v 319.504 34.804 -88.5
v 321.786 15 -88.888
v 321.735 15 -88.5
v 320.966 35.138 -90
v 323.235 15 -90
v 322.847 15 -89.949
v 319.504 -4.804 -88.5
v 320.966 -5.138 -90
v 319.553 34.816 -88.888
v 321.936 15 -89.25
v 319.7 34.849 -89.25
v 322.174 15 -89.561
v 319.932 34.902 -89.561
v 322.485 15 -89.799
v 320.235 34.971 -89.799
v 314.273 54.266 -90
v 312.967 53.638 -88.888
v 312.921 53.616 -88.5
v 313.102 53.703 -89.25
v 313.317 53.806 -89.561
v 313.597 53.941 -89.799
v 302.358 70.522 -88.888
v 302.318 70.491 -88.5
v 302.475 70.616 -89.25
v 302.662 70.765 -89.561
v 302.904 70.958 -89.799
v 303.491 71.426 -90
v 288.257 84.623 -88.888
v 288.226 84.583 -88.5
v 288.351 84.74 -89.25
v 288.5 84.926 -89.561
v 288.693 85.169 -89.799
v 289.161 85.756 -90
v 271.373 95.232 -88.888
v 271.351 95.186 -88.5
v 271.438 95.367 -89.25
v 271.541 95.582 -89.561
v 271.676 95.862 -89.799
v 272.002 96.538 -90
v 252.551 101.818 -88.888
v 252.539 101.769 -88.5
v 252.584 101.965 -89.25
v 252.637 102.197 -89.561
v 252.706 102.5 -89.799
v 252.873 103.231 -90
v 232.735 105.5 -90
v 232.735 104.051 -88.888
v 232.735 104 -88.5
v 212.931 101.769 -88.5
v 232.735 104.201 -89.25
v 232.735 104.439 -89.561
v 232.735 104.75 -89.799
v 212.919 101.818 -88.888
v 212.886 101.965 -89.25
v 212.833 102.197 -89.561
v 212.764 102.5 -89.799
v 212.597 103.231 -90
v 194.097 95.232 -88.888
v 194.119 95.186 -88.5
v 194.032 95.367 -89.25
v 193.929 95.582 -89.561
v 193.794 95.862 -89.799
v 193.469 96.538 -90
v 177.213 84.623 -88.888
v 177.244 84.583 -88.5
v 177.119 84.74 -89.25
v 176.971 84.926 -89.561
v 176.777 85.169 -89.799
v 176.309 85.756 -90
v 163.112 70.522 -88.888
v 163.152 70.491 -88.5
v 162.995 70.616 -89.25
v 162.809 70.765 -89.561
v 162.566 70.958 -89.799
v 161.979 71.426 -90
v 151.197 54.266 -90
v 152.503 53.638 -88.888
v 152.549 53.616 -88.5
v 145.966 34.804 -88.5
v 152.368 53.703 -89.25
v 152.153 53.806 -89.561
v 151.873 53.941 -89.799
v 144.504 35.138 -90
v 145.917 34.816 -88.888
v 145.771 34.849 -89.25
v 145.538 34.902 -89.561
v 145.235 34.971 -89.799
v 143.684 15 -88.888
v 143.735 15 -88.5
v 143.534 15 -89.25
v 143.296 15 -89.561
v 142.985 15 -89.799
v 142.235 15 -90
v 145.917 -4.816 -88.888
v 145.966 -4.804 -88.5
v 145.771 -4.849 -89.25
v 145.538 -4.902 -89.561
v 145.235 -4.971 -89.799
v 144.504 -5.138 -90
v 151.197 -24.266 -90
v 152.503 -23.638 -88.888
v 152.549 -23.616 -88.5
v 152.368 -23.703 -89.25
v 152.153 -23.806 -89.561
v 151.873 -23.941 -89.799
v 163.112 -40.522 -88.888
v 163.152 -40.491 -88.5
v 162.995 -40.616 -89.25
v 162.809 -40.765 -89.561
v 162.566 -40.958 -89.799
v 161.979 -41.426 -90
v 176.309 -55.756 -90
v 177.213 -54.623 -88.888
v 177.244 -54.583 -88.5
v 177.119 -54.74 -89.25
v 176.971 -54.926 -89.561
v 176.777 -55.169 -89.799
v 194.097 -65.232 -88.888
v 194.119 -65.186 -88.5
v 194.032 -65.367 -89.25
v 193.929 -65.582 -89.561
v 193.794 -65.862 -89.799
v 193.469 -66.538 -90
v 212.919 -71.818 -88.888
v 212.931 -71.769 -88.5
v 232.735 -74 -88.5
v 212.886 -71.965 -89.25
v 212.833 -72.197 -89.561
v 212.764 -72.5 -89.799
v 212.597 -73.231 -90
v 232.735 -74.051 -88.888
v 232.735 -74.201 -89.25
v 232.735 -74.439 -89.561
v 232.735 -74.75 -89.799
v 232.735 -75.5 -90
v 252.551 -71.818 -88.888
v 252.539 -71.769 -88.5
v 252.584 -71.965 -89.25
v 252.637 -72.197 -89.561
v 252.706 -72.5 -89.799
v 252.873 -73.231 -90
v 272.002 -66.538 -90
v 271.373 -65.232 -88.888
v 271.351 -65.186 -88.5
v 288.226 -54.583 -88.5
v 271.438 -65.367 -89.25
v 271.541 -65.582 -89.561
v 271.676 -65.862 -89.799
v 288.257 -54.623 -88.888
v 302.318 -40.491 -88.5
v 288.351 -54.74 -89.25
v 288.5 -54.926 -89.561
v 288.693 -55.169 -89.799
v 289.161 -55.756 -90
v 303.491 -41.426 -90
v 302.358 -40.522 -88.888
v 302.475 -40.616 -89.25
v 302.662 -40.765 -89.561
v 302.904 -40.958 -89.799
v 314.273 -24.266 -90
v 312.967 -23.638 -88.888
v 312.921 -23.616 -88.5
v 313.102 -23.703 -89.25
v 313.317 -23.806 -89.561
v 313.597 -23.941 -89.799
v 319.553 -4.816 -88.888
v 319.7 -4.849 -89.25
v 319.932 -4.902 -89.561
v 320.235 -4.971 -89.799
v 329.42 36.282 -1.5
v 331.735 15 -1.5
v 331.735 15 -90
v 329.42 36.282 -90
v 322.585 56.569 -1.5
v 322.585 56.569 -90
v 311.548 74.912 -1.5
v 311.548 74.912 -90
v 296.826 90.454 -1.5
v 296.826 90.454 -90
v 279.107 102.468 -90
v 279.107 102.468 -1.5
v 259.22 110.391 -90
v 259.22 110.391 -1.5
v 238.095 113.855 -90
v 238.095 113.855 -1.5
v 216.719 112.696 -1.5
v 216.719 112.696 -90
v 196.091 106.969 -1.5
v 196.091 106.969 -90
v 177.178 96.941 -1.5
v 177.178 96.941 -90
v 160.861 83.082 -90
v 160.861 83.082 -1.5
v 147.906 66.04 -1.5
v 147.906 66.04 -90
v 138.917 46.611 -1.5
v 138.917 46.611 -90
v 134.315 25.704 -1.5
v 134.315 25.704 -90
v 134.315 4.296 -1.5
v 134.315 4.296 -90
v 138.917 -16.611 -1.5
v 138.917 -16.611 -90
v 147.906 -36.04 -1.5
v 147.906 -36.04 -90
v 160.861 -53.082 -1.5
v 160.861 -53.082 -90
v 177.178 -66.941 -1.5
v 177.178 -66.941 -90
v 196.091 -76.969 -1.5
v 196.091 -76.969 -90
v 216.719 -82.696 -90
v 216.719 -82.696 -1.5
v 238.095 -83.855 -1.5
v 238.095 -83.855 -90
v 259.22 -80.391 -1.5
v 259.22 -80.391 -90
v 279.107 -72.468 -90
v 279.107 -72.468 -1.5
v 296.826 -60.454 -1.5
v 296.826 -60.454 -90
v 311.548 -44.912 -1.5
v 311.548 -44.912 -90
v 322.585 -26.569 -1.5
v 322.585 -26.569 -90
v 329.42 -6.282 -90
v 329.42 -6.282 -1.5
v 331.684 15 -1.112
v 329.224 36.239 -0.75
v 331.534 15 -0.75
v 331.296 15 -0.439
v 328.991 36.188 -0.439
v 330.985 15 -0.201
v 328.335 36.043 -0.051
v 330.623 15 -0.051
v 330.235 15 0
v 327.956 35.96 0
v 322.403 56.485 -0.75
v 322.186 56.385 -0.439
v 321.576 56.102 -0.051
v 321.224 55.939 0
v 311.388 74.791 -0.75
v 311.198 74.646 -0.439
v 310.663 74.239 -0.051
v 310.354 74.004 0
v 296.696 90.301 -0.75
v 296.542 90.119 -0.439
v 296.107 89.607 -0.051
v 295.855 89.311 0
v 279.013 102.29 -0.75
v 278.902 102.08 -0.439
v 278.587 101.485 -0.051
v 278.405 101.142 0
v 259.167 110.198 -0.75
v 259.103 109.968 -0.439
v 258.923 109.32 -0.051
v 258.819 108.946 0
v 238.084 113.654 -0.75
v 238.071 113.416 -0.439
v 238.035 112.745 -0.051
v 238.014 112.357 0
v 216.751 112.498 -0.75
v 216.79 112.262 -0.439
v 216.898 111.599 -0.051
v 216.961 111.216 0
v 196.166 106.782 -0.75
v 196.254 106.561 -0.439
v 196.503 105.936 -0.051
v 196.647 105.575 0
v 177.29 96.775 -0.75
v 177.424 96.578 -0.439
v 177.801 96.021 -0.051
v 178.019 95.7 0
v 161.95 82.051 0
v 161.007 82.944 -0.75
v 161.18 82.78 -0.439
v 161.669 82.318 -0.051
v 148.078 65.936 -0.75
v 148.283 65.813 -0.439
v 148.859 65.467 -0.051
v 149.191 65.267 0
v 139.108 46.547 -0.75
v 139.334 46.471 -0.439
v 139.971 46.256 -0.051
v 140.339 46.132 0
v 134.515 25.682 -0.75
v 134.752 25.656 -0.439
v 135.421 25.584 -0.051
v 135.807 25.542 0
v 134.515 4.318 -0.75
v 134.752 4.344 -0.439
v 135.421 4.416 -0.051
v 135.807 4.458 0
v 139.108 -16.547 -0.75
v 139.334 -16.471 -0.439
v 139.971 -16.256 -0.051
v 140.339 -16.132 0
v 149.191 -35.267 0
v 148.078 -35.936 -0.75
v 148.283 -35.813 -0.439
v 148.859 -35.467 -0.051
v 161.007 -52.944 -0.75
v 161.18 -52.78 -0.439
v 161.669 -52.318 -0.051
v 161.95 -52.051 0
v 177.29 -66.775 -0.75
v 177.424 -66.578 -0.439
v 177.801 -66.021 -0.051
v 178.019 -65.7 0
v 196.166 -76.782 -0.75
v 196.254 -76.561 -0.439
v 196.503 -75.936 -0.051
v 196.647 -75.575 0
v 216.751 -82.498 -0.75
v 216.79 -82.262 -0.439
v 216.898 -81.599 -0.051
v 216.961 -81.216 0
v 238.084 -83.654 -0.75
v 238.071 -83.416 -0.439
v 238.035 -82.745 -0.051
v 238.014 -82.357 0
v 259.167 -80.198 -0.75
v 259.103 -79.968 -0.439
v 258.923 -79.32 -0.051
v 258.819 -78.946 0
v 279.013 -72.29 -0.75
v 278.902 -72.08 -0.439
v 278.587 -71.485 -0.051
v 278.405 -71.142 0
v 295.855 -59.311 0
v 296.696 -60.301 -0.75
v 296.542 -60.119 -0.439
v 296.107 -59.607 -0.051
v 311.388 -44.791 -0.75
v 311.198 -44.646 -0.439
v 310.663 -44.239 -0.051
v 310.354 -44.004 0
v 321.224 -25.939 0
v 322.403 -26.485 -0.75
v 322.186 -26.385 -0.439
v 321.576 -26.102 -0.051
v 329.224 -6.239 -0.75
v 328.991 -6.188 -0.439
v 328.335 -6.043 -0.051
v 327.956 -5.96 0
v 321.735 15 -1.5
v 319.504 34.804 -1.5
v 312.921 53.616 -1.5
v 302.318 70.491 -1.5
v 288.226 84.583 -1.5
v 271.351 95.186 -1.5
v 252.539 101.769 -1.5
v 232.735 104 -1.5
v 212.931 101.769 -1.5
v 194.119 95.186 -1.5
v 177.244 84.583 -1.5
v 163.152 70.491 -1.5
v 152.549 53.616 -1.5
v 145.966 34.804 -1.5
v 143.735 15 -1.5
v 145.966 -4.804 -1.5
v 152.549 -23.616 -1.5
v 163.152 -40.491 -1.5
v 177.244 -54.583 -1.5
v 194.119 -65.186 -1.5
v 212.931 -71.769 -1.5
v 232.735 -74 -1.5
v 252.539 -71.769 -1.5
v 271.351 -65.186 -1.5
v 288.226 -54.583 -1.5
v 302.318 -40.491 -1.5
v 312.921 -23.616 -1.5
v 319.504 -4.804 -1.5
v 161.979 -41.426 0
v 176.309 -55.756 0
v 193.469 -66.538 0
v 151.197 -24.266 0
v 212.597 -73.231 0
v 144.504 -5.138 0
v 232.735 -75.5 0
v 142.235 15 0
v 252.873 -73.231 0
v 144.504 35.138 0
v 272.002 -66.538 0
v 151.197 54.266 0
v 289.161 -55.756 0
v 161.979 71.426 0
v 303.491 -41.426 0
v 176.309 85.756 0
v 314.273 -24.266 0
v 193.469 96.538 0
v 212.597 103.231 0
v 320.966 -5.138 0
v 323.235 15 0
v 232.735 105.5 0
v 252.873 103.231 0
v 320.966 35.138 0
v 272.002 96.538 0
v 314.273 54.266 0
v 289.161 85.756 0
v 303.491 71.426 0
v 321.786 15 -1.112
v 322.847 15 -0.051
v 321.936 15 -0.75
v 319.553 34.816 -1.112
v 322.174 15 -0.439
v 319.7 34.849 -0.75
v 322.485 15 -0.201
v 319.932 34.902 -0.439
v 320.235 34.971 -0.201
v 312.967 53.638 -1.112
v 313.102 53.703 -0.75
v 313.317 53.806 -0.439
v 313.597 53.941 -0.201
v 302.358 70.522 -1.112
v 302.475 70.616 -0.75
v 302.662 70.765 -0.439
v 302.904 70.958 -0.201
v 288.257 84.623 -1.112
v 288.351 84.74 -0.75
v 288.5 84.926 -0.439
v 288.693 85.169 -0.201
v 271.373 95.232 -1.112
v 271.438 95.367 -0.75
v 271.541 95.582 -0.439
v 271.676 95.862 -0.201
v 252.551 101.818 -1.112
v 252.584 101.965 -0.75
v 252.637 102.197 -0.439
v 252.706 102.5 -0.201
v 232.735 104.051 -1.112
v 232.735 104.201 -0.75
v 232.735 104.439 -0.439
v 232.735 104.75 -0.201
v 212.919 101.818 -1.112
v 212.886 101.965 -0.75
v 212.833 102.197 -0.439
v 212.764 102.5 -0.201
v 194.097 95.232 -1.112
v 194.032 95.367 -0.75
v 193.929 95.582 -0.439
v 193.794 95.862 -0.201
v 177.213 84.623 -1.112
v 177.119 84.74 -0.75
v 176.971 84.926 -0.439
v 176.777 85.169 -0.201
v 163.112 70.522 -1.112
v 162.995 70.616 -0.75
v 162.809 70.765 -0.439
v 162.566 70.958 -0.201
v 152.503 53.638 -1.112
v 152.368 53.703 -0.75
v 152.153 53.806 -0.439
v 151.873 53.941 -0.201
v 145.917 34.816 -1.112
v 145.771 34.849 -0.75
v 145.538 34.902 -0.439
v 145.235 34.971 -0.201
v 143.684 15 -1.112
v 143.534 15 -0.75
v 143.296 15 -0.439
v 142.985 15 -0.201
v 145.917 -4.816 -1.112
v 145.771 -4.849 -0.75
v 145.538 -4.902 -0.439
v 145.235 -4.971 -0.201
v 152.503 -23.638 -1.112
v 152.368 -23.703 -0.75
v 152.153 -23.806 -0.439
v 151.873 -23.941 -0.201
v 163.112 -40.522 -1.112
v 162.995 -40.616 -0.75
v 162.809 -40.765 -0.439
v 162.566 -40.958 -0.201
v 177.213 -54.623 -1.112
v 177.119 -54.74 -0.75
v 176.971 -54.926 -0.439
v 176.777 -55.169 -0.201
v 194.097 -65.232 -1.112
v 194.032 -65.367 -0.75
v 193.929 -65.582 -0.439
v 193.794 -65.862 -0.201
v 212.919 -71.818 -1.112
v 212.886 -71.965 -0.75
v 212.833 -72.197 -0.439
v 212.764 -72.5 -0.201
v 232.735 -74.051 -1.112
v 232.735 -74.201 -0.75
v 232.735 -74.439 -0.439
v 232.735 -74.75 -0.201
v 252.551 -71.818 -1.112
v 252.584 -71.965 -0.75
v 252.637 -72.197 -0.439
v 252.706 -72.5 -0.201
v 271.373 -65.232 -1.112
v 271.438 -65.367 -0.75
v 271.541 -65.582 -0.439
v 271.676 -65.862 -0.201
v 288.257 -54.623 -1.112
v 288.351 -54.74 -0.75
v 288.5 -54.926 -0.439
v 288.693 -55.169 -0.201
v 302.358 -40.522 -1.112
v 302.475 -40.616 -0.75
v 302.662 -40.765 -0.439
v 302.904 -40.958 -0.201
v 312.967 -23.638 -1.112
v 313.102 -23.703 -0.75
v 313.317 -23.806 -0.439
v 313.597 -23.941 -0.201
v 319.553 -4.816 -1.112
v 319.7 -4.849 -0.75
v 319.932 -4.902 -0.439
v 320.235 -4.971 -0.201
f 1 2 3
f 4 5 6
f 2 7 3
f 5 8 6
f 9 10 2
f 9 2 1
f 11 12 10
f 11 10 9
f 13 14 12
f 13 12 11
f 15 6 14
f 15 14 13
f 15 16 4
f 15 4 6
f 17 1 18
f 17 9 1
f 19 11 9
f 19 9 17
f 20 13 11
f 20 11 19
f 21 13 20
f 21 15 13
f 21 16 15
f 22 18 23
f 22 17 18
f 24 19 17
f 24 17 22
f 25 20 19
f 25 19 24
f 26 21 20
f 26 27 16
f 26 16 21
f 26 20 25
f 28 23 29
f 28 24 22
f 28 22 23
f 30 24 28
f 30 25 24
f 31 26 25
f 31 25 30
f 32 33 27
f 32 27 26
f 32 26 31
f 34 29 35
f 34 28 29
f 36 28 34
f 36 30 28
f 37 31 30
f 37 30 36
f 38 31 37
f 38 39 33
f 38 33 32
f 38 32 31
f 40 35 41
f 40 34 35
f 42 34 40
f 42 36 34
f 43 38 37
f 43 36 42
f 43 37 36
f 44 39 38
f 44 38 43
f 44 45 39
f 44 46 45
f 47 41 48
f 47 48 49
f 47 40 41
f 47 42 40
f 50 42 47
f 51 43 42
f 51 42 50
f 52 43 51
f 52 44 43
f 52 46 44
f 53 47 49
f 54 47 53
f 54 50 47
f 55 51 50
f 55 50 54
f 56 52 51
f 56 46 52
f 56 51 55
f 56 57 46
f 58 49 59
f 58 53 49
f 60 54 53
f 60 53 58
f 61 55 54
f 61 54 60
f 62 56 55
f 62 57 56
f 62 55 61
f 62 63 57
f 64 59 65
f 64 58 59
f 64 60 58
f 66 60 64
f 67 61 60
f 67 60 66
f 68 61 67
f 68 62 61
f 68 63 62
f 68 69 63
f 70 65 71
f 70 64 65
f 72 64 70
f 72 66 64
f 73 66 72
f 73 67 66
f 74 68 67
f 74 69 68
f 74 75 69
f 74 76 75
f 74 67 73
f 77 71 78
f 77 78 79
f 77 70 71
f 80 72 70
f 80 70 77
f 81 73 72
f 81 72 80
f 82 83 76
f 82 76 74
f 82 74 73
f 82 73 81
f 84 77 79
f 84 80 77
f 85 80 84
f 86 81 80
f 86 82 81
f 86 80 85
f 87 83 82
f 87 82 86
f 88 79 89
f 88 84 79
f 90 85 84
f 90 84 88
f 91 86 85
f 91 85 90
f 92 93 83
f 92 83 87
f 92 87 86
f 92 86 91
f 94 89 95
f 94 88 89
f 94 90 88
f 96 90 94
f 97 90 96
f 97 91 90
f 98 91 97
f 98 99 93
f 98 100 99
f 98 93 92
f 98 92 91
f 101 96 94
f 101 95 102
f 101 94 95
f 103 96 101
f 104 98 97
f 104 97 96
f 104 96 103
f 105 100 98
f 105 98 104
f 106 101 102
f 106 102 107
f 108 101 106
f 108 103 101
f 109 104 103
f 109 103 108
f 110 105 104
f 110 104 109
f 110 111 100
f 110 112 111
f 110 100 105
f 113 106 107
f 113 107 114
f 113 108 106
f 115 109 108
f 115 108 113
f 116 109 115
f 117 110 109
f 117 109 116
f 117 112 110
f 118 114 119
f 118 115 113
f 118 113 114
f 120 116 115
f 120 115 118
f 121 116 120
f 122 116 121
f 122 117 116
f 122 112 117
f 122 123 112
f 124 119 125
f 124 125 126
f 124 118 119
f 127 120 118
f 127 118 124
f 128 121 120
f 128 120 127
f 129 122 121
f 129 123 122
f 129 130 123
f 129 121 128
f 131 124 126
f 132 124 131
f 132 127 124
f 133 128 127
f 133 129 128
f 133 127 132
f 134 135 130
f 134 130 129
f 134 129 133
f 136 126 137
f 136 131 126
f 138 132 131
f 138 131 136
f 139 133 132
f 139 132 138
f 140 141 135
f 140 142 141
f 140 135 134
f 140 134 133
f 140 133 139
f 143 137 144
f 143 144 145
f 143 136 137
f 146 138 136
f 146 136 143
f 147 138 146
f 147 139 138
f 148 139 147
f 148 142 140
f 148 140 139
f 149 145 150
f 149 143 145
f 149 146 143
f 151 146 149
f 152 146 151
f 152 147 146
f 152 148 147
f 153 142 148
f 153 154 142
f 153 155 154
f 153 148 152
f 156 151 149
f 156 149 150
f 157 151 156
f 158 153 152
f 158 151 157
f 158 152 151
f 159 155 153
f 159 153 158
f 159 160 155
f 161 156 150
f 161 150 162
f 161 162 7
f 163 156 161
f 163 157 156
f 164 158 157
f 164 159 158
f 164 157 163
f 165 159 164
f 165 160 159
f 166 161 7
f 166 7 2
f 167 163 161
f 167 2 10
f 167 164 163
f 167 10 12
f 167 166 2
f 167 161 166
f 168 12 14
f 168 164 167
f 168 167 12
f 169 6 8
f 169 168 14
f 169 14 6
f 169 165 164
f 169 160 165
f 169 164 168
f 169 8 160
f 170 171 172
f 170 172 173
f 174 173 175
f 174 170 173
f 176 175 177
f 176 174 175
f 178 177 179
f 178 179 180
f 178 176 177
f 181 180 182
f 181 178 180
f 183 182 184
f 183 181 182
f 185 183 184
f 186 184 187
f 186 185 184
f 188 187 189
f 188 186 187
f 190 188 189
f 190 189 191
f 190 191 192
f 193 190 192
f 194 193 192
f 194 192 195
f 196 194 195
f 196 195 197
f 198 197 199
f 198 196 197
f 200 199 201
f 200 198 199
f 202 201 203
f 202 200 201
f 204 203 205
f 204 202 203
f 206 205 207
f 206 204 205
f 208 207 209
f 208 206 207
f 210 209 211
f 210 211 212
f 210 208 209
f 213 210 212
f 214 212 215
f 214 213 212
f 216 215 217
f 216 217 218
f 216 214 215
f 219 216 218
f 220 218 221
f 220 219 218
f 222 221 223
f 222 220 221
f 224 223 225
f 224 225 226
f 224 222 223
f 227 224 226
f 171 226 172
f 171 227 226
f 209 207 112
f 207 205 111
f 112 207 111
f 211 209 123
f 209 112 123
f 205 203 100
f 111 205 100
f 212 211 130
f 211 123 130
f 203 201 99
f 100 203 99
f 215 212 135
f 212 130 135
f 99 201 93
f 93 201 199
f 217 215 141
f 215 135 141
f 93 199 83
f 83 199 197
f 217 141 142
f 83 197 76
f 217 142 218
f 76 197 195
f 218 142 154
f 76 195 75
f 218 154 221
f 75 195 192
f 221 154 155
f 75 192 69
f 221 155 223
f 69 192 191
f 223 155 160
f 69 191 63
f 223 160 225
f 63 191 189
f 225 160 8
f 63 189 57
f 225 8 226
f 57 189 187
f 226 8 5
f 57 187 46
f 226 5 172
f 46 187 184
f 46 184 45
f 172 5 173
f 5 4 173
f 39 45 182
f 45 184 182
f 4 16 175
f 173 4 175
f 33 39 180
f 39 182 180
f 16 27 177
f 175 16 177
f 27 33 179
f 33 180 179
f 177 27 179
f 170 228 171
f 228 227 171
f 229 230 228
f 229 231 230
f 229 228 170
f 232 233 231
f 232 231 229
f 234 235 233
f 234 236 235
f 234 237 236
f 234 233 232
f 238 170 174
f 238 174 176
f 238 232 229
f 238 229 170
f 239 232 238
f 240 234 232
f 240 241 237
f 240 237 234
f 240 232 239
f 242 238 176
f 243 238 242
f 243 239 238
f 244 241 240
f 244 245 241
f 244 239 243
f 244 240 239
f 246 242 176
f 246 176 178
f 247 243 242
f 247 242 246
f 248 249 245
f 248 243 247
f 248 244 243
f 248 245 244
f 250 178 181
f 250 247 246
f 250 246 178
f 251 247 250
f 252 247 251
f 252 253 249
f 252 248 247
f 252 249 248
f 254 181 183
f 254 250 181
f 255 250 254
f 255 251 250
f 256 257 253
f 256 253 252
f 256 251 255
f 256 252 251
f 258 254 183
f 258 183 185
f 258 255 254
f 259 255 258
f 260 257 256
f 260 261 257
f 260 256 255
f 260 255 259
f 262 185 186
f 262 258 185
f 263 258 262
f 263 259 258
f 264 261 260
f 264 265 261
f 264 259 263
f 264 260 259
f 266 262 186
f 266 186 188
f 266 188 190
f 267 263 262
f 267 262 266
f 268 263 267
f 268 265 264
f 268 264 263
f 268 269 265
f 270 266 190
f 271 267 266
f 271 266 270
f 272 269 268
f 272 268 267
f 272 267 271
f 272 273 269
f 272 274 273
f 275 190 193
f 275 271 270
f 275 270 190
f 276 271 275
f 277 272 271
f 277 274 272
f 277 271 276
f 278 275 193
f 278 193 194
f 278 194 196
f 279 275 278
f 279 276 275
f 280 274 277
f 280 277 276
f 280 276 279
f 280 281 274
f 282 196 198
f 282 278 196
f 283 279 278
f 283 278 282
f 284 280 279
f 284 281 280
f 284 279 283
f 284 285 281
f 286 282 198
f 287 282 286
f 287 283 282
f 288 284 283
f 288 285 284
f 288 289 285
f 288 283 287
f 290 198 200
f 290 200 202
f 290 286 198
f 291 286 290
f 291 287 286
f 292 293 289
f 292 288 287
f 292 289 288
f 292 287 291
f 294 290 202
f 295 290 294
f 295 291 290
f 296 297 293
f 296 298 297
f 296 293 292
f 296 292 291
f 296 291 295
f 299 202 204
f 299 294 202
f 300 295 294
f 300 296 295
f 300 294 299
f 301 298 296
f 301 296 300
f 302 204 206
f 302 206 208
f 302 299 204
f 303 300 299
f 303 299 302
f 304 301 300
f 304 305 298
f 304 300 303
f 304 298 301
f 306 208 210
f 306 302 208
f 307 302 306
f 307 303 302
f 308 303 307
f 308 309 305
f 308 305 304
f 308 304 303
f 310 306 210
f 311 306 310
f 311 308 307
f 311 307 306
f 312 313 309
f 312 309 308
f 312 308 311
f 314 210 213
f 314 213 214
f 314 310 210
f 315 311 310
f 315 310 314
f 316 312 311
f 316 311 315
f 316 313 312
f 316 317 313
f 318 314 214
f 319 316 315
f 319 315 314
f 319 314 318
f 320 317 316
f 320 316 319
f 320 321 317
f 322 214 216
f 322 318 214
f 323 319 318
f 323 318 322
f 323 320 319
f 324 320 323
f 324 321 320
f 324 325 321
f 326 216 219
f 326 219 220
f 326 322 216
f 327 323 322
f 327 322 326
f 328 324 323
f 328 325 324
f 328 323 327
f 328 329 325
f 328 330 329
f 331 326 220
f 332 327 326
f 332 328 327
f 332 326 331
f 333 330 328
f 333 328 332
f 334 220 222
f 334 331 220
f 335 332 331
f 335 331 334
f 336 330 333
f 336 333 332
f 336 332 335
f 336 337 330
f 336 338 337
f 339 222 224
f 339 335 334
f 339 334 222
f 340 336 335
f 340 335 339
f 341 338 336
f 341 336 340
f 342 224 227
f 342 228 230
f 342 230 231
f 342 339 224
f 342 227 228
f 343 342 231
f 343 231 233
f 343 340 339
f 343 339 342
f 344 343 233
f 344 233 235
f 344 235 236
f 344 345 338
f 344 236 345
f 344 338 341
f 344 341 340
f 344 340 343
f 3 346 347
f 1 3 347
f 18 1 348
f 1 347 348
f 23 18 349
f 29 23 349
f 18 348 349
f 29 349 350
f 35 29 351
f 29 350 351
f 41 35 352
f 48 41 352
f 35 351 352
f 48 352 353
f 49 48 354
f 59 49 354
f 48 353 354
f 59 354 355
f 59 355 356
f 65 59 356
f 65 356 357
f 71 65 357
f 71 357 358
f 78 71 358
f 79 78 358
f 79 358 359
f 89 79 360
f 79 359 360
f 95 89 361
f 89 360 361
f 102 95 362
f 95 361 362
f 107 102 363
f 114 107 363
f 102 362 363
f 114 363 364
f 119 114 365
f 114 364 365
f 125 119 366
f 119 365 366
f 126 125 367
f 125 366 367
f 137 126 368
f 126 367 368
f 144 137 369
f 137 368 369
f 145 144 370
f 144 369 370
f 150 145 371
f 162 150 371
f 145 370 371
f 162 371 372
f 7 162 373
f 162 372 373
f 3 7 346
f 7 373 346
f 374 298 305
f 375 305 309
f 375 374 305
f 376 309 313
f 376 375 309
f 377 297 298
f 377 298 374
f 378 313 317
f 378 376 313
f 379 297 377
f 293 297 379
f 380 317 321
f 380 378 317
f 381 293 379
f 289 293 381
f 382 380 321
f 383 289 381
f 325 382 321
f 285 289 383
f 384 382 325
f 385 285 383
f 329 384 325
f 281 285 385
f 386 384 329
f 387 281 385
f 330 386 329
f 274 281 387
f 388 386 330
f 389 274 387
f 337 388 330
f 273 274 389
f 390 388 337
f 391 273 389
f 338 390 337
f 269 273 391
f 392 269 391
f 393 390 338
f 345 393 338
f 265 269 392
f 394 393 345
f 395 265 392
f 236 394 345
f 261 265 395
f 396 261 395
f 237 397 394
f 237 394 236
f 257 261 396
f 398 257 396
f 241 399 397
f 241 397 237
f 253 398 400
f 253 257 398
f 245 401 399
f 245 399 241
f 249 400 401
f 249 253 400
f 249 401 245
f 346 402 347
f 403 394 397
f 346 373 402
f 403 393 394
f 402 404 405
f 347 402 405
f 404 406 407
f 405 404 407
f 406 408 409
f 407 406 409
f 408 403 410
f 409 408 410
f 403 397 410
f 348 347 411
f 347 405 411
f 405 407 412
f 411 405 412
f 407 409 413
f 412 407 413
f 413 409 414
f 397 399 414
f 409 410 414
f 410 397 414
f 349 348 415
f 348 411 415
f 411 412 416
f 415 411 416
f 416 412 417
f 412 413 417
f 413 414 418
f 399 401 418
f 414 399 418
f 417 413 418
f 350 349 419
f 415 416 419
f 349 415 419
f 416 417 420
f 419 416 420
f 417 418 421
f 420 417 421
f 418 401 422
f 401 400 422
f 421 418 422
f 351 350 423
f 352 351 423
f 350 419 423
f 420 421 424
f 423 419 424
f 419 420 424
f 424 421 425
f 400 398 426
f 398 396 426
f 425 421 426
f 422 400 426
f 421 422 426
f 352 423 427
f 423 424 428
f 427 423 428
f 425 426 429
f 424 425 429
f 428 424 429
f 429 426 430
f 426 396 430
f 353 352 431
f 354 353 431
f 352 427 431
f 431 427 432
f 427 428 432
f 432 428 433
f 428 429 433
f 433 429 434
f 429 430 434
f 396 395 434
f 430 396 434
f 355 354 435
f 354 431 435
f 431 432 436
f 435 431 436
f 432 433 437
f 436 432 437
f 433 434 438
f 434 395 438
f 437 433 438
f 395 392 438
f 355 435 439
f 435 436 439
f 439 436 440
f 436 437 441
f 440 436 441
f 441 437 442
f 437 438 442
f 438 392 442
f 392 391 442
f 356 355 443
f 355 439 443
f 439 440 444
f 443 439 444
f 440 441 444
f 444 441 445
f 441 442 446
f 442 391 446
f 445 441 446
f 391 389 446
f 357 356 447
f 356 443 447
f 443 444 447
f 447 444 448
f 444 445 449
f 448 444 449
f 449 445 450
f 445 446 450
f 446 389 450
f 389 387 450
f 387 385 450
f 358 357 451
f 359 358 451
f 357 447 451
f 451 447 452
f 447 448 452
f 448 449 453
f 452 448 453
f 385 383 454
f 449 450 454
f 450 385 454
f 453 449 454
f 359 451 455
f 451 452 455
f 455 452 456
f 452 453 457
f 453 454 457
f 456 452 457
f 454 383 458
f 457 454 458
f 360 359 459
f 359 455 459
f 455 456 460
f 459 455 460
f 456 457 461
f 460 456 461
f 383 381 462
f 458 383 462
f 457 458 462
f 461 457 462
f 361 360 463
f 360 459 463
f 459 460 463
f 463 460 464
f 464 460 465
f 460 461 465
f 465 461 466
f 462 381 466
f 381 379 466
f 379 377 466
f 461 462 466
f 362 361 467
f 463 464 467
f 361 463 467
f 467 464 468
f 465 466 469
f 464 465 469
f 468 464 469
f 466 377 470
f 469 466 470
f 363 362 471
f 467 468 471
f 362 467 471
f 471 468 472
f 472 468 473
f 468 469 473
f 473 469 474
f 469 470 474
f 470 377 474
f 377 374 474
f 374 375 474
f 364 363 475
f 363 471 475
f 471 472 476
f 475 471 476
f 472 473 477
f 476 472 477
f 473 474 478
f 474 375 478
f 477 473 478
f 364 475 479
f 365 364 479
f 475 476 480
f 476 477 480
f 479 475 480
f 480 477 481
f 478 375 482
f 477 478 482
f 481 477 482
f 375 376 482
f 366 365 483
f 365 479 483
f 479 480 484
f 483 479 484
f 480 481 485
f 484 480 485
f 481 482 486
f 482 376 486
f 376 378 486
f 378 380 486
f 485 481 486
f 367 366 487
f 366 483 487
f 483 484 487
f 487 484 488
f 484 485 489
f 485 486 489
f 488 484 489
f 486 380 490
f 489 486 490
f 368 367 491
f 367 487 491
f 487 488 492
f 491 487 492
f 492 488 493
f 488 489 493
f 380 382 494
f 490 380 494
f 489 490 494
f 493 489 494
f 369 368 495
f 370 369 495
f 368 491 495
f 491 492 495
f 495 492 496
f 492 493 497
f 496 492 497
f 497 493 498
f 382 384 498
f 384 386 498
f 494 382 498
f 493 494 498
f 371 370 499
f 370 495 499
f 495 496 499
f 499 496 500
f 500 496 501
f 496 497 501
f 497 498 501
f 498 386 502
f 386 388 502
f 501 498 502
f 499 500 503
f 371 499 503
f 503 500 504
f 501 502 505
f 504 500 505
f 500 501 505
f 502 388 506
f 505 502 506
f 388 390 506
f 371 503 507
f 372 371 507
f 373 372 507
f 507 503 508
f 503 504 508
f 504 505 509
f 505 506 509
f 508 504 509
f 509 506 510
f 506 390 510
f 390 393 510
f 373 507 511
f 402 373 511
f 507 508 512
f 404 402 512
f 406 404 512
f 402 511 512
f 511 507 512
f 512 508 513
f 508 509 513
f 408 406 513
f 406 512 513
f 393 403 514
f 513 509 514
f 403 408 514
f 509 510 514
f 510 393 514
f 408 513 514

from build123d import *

# Parameters (mm, degrees)
SKETCH1_R           = 99
SKETCH1_R_2         = 89
BOSS_EXTRUDE1_DEPTH = 90
FILLET1_R           = 1.5


with BuildPart() as part:
    # Sketch1 → Boss-Extrude1 (new body)
    with BuildSketch(Plane.XY):
        with Locations((232.735026919, 15)):
            Circle(SKETCH1_R)
        with Locations((232.735026919, 15)):
            Circle(SKETCH1_R_2, mode=Mode.SUBTRACT)
    extrude(amount=-BOSS_EXTRUDE1_DEPTH)

    # Fillet1
    fillet1_edges = [part.edges().sort_by_distance(p)[0] for p in [
        (133.735026919, 15, 0),
        (143.735026919, 15, -90),
        (143.735026919, 15, 0),
    ]]
    fillet(fillet1_edges, radius=FILLET1_R)


solid = part.part
